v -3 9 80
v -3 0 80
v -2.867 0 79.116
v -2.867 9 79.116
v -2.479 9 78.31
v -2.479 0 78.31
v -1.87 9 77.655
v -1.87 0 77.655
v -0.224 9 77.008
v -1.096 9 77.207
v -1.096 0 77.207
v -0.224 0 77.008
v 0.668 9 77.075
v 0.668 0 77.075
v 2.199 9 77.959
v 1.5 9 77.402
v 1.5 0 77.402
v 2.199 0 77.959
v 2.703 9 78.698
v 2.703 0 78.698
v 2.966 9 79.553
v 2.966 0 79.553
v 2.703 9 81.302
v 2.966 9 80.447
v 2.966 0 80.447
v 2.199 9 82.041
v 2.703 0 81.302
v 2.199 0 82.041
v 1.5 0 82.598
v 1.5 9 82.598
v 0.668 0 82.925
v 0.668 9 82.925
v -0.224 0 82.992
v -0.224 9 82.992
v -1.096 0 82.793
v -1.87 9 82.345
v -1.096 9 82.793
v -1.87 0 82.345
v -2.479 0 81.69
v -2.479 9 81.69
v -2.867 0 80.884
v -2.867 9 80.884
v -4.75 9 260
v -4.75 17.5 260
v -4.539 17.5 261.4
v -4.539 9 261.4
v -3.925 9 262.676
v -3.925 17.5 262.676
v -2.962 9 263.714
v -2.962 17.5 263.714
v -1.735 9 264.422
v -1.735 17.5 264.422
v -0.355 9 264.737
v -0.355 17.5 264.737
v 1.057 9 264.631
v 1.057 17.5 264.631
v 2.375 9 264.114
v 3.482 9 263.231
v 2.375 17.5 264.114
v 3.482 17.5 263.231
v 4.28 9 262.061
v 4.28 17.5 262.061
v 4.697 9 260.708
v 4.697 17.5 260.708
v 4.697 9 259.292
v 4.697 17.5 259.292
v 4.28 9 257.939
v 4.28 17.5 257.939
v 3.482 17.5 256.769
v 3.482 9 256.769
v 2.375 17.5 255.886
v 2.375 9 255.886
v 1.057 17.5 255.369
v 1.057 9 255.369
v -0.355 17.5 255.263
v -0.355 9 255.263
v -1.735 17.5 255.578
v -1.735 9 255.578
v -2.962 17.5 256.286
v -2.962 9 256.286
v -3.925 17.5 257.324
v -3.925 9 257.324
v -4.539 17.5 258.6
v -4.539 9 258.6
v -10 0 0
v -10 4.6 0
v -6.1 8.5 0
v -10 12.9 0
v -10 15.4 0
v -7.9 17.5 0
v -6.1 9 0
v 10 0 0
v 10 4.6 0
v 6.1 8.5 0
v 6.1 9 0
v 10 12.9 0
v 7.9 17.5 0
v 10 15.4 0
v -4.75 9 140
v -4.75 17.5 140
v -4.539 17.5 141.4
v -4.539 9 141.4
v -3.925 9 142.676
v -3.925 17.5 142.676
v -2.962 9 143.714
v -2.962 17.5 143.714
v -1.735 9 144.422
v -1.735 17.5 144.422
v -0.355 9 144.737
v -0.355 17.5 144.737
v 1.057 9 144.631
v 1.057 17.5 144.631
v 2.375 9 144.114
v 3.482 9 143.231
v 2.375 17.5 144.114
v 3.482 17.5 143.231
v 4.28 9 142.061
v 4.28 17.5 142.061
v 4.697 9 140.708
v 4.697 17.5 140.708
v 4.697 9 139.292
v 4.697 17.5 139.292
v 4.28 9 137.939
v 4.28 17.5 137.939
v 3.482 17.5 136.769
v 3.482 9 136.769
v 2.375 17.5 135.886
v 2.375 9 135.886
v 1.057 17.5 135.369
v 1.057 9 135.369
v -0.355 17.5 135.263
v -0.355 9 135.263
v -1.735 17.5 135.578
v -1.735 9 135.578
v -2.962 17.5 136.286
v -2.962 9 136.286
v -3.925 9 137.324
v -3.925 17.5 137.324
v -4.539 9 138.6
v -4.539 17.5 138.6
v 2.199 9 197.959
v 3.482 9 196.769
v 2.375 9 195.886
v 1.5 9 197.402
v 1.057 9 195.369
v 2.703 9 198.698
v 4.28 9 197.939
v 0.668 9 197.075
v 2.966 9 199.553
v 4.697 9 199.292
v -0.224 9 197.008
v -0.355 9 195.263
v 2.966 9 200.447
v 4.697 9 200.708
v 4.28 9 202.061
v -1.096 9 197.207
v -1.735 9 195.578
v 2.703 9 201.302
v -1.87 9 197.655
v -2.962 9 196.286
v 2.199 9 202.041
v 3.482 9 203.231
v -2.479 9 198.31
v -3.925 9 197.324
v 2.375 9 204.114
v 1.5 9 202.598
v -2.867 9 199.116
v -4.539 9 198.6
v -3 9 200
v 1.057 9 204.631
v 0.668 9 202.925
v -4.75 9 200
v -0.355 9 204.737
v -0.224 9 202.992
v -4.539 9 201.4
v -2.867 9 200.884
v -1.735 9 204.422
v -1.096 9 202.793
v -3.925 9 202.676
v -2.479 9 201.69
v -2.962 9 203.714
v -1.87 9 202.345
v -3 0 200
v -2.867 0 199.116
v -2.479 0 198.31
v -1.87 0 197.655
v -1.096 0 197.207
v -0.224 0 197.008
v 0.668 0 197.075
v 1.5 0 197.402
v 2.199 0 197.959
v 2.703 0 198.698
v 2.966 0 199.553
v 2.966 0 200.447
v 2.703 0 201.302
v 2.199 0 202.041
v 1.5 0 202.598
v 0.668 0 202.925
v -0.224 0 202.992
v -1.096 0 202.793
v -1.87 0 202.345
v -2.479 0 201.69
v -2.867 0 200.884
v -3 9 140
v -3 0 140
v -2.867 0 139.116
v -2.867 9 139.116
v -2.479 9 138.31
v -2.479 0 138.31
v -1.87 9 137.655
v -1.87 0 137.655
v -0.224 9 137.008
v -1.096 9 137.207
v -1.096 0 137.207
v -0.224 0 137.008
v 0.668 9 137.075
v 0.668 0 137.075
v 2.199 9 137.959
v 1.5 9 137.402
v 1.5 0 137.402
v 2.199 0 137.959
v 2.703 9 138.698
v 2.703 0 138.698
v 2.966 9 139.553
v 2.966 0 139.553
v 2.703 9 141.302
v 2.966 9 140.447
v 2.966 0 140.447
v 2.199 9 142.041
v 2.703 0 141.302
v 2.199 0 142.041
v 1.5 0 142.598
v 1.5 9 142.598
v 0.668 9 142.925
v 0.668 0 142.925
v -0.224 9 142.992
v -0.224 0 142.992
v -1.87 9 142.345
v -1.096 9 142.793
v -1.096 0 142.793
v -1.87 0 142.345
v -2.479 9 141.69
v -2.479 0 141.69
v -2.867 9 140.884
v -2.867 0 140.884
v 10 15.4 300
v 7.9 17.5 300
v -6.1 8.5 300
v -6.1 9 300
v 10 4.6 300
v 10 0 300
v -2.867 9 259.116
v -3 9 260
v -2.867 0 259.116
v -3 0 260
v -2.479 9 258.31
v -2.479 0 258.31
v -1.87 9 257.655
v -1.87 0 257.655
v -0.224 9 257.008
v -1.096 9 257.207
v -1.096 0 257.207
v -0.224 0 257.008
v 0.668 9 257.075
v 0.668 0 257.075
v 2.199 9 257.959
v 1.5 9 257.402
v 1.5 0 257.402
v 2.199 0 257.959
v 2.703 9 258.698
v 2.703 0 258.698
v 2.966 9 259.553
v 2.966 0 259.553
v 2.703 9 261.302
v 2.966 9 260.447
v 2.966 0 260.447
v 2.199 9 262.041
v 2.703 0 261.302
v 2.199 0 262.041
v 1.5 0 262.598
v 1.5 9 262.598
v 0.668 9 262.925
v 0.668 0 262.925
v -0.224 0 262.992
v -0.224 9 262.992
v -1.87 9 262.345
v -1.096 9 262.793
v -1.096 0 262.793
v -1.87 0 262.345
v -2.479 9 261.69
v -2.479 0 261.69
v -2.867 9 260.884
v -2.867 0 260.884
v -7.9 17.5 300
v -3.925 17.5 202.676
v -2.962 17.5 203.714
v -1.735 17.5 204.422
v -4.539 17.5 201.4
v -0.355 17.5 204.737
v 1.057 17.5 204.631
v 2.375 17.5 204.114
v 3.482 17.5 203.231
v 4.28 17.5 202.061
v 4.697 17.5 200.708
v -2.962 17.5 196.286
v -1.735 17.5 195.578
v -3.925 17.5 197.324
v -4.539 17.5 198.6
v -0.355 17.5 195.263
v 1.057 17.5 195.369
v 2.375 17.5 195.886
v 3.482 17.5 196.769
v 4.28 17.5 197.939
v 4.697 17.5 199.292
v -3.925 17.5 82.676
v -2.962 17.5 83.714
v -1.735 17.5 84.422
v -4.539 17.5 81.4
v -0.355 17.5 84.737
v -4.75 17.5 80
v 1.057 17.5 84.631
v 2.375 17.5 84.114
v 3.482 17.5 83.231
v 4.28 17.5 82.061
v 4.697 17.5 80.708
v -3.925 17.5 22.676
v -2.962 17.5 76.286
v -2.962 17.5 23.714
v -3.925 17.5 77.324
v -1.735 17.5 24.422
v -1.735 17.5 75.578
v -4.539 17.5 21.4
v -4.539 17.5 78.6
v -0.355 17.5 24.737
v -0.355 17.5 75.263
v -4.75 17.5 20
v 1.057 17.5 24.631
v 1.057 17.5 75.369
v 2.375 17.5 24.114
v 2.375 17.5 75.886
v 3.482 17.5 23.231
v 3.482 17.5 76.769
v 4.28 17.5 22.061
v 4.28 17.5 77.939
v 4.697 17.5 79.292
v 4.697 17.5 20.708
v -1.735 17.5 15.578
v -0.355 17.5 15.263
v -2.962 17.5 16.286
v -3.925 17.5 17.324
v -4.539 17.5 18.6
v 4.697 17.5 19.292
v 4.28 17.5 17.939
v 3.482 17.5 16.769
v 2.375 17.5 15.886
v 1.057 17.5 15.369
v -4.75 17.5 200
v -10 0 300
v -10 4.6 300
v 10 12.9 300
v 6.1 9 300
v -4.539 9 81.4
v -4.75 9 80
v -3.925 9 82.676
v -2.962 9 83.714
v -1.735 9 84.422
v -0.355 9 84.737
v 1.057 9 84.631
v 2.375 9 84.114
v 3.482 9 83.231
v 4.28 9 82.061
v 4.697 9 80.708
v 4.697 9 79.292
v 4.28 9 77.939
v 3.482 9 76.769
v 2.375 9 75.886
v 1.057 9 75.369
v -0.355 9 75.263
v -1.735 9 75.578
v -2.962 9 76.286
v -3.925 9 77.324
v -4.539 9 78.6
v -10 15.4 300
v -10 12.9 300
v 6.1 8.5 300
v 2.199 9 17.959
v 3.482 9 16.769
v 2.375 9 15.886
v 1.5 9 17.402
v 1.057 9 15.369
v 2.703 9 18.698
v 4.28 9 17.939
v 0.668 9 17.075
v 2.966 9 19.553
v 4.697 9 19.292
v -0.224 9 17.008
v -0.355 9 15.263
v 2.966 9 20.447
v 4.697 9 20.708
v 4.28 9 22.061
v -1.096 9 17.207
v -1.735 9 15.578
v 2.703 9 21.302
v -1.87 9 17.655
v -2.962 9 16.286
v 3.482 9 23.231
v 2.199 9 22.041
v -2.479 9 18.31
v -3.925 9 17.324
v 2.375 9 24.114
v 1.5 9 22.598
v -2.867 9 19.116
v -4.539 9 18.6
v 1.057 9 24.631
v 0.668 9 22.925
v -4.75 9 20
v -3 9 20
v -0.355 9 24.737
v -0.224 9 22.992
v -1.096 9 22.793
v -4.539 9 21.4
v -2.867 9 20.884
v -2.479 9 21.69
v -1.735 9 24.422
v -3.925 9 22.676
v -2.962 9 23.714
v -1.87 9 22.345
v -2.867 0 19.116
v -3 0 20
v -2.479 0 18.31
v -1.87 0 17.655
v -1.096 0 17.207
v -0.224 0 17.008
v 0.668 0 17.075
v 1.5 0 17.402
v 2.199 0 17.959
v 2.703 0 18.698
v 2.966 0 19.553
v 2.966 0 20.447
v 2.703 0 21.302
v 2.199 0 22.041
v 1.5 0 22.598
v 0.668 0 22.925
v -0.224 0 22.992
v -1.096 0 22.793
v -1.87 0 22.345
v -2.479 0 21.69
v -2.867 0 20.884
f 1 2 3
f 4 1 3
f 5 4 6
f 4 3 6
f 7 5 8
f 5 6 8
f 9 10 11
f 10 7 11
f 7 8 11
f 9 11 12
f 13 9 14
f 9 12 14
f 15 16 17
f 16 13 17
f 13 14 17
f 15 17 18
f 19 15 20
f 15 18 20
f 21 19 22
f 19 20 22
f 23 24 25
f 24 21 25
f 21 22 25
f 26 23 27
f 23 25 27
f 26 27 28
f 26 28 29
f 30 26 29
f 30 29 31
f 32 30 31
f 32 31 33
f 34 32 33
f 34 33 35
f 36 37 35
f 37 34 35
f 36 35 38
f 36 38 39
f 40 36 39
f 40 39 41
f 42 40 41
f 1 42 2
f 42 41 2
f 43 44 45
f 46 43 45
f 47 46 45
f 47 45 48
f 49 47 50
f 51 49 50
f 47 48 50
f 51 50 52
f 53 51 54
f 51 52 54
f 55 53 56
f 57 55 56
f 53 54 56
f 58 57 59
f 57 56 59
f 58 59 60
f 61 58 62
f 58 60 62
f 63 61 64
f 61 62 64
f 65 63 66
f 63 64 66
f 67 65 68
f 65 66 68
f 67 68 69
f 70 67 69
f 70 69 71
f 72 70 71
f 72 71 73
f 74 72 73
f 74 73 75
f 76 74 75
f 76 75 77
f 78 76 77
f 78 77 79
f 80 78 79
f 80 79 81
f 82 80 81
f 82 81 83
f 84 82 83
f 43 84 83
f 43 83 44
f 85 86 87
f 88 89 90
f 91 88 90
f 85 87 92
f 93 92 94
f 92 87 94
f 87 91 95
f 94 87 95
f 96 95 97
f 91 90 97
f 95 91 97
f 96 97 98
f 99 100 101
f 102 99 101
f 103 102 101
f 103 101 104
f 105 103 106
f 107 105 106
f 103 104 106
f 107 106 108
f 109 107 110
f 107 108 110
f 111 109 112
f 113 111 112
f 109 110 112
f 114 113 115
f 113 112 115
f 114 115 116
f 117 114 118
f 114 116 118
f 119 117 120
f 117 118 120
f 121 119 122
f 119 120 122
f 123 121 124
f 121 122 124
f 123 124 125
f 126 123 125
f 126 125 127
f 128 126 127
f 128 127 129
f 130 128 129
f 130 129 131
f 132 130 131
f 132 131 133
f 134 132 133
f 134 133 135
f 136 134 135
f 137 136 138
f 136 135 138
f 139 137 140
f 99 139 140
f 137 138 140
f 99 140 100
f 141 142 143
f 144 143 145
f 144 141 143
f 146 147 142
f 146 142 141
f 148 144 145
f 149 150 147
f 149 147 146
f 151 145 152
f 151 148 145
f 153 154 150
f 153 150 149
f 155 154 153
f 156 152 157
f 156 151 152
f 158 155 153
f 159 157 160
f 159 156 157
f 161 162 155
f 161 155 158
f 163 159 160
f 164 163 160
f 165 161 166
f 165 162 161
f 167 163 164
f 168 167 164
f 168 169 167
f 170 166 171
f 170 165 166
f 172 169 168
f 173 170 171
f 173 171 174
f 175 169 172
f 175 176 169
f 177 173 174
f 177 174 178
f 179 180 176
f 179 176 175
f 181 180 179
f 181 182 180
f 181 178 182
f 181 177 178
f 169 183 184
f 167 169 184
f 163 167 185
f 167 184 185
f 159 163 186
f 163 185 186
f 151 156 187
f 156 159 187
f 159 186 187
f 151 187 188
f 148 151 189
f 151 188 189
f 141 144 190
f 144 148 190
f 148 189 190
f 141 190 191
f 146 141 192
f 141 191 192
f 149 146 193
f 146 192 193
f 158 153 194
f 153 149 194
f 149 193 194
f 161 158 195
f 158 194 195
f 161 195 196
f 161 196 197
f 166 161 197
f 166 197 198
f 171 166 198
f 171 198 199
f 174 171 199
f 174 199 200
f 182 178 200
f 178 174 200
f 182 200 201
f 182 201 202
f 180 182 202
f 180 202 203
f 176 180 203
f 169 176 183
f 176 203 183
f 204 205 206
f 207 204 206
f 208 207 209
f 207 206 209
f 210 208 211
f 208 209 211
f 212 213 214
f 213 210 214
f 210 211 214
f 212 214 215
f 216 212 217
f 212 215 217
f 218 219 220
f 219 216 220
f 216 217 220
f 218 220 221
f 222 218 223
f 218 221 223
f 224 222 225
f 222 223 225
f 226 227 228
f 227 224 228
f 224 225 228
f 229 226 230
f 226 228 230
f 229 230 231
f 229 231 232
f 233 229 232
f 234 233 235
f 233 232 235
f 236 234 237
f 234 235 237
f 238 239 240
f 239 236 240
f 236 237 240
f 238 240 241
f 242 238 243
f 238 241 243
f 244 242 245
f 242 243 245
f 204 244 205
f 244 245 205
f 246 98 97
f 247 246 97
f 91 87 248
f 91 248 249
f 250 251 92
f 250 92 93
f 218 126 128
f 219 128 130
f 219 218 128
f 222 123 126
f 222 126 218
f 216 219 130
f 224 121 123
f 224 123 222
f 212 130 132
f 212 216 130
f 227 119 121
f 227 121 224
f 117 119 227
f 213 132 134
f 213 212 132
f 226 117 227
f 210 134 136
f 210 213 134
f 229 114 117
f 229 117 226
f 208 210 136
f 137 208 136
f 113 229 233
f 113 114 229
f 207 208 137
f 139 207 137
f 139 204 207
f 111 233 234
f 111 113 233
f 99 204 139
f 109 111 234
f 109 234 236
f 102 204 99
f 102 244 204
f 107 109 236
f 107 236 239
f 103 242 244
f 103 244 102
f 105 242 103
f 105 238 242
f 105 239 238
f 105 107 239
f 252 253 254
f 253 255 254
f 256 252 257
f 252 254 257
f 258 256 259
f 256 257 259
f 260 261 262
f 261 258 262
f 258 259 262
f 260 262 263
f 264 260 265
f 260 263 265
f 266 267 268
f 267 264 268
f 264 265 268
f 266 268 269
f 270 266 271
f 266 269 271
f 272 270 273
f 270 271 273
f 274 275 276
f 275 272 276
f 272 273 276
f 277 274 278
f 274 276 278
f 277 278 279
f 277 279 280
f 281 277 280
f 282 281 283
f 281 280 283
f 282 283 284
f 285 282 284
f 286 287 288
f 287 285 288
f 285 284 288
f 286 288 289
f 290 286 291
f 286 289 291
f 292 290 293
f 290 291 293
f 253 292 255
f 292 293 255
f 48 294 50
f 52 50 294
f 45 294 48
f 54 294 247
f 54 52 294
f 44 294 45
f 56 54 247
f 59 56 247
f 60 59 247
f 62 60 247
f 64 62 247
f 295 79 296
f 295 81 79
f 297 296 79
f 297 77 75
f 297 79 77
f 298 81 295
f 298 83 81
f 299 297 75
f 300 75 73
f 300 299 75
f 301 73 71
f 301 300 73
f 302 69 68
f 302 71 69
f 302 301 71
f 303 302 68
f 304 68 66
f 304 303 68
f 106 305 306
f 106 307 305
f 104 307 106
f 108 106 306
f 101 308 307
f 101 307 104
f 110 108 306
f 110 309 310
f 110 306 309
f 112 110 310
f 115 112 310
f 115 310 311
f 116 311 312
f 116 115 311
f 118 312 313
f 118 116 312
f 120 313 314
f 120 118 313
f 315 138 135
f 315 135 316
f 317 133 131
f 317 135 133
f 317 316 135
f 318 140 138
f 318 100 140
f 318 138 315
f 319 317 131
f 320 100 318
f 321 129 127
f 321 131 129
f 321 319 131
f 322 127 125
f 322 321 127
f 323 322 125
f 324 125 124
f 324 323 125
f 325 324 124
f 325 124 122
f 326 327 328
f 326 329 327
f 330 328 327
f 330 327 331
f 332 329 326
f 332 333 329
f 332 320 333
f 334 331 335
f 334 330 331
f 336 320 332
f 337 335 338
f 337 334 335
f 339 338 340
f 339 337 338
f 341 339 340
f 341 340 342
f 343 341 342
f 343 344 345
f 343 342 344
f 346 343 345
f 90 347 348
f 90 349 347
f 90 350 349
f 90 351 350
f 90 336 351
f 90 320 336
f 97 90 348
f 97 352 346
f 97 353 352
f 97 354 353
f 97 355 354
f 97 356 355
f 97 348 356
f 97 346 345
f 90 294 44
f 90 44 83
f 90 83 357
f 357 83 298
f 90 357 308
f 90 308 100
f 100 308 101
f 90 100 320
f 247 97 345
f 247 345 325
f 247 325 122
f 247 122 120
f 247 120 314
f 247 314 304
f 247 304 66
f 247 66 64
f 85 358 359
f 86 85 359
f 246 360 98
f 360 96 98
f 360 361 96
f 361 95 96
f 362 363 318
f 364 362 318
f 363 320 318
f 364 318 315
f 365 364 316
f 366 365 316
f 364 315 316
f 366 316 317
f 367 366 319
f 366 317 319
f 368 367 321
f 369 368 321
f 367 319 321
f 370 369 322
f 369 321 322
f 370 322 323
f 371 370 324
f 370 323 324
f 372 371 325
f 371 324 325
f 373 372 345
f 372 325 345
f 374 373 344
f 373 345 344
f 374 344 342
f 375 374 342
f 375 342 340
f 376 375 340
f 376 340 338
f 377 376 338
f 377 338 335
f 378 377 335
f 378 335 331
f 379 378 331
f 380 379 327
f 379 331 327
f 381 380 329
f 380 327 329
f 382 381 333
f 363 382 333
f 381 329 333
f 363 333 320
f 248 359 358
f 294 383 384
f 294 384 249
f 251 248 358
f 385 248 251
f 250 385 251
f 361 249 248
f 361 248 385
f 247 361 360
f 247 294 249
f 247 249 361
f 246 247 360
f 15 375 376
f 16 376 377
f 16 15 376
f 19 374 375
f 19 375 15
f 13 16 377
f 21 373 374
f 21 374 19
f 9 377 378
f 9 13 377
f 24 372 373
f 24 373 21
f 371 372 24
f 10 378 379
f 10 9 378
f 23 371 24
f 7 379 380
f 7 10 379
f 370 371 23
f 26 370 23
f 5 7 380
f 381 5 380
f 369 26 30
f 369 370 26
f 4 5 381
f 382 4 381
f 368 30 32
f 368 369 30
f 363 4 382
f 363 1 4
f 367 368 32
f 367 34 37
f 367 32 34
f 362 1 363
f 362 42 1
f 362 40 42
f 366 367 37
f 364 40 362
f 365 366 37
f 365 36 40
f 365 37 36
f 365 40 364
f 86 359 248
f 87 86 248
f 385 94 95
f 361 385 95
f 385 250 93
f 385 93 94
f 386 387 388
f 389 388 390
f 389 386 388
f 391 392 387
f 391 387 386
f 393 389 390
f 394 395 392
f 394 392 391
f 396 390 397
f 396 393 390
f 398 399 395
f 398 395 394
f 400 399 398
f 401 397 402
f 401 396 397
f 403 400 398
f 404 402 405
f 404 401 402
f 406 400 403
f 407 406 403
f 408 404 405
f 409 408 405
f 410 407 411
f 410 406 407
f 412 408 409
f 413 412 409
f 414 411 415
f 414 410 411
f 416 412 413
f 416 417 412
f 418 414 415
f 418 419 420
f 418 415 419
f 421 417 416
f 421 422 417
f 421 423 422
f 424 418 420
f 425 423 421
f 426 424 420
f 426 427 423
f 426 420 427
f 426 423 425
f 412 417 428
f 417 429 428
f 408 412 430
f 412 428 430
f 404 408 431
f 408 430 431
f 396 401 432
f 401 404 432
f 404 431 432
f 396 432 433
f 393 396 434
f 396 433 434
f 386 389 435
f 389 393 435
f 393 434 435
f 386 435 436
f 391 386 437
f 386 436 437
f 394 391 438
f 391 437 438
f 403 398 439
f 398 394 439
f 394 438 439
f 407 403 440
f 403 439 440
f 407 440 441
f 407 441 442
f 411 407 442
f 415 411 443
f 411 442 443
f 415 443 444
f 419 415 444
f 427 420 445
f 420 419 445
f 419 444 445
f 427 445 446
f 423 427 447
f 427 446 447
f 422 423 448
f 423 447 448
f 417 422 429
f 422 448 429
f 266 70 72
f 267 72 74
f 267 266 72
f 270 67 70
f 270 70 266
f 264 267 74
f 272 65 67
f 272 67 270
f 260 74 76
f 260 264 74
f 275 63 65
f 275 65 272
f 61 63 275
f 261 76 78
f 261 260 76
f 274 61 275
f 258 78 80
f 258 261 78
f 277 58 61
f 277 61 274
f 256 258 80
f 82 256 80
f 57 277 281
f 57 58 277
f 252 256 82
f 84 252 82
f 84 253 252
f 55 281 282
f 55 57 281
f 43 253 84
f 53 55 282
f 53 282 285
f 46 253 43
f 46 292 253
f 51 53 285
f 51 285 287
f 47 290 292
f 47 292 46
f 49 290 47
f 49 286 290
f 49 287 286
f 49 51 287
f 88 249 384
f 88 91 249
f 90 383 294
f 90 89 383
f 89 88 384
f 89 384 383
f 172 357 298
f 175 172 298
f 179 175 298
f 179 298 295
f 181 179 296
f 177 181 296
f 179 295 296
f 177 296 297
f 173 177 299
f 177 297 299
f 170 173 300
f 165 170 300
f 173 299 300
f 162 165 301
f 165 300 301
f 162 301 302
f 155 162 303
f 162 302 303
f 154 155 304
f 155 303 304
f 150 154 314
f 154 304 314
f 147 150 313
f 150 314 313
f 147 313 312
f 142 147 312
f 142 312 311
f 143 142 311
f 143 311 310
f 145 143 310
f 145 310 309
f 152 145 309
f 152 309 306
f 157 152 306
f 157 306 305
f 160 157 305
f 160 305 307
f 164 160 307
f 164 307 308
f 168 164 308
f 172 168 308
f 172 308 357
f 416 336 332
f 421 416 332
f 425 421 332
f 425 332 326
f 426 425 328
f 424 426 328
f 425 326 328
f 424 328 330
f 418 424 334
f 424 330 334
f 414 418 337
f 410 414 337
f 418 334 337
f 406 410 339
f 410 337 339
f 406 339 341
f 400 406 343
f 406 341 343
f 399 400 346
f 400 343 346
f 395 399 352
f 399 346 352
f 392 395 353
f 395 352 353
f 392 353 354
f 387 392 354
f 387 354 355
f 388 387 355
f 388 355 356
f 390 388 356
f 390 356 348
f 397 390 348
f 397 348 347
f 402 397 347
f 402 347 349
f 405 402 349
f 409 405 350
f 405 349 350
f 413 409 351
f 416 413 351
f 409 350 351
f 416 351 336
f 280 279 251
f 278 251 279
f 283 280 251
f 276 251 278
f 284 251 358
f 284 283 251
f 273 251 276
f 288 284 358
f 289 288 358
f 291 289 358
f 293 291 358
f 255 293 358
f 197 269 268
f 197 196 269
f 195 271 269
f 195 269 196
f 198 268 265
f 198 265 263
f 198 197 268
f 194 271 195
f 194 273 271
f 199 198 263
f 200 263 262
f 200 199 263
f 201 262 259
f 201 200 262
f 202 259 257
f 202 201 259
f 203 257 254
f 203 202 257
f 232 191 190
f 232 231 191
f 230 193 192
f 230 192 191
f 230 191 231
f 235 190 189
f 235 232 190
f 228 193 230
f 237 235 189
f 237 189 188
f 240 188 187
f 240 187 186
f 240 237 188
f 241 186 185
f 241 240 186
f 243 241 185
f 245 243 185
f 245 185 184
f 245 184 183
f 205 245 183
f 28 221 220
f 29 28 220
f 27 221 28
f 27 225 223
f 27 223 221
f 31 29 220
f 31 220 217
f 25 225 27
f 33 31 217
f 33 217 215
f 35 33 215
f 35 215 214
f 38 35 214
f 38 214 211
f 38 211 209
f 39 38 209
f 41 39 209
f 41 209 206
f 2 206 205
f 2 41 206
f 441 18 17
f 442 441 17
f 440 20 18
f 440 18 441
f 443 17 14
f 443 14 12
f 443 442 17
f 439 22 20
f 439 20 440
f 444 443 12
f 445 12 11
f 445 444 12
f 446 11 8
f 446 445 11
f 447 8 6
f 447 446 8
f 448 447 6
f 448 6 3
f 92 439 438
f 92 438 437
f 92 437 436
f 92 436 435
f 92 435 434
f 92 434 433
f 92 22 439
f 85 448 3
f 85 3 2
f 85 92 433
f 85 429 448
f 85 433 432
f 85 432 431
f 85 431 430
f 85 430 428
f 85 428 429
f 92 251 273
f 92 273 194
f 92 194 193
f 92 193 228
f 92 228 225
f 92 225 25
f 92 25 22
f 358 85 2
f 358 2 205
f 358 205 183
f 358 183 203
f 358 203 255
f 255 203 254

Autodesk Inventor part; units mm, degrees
ref_plane "YZ Plane" through (0, 0, 0) normal (1, 0, 0) x (0, 1, 0)
ref_plane "XZ Plane" through (0, 0, 0) normal (0, 1, 0) x (-1, 0, 0)
ref_plane "XY Plane" through (0, 0, 0) normal (0, 0, 1) x (1, 0, 0)
sketch "Sketch1" plane through (0, 0, 0) normal (0, 0, 1) x (1, 0, 0)
  line L0 (0, 0) -> (0, 17.5) construction
  line L1 (0, 0) -> (-10, 0)
  line L2 (0, 0) -> (10, 0)
  line L3 (-10, 0) -> (-10, 4.6)
  line L4 (-10, 4.6) -> (-6.1, 8.5)
  line L5 (-6.1, 8.5) -> (-6.1, 9)
  line L6 (-6.1, 9) -> (-10, 12.9)
  line L7 (-10, 12.9) -> (-10, 15.4)
  line L8 (-10, 15.4) -> (-7.9, 17.5)
  line L9 (-7.9, 17.5) -> (0, 17.5)
  line L10 (10, 0) -> (10, 4.6)
  line L11 (10, 4.6) -> (6.1, 8.5)
  line L12 (6.1, 8.5) -> (6.1, 9)
  line L13 (6.1, 9) -> (10, 12.9)
  line L14 (10, 12.9) -> (10, 15.4)
  line L15 (10, 15.4) -> (7.9, 17.5)
  line L16 (7.9, 17.5) -> (0, 17.5)
  dimension "d0" = 17.5
  dimension "d1" = 20
  dimension "d2" = 4.6
  dimension "d3" = 8.5
  dimension "d8" = 135
  dimension "d9" = 0.5
  dimension "d10" = 135
  dimension "d11" = 2.5
extrude "Extrusion1" add sketch "Sketch1" along normal blind 300
sketch "Sketch2" plane through (0, 0, 0) normal (0, 1, 0) x (-1, 0, 0)
  line L0 (0, 0) -> (0, 20) construction
  line L1 (0, 20) -> (0, 80) construction
  circle A0 centre (0, 20) radius 4.75
  circle A1 centre (0, 20) radius 3
  dimension "d14" = 20
  dimension "d15" = 60
  dimension "d16" = 9.5
  dimension "d17" = 6
extrude "Extrusion2" cut sketch "Sketch2" along normal through all contours A1
extrude "Extrusion3" cut sketch "Sketch2" against normal blind 8.5 from surface at 17.5
pattern_linear "Rectangular Pattern1" count 9 spacing 60 along (0, 0, 1) of "Extrusion2", "Extrusion3"
properties part number "HGR20 500mm"
